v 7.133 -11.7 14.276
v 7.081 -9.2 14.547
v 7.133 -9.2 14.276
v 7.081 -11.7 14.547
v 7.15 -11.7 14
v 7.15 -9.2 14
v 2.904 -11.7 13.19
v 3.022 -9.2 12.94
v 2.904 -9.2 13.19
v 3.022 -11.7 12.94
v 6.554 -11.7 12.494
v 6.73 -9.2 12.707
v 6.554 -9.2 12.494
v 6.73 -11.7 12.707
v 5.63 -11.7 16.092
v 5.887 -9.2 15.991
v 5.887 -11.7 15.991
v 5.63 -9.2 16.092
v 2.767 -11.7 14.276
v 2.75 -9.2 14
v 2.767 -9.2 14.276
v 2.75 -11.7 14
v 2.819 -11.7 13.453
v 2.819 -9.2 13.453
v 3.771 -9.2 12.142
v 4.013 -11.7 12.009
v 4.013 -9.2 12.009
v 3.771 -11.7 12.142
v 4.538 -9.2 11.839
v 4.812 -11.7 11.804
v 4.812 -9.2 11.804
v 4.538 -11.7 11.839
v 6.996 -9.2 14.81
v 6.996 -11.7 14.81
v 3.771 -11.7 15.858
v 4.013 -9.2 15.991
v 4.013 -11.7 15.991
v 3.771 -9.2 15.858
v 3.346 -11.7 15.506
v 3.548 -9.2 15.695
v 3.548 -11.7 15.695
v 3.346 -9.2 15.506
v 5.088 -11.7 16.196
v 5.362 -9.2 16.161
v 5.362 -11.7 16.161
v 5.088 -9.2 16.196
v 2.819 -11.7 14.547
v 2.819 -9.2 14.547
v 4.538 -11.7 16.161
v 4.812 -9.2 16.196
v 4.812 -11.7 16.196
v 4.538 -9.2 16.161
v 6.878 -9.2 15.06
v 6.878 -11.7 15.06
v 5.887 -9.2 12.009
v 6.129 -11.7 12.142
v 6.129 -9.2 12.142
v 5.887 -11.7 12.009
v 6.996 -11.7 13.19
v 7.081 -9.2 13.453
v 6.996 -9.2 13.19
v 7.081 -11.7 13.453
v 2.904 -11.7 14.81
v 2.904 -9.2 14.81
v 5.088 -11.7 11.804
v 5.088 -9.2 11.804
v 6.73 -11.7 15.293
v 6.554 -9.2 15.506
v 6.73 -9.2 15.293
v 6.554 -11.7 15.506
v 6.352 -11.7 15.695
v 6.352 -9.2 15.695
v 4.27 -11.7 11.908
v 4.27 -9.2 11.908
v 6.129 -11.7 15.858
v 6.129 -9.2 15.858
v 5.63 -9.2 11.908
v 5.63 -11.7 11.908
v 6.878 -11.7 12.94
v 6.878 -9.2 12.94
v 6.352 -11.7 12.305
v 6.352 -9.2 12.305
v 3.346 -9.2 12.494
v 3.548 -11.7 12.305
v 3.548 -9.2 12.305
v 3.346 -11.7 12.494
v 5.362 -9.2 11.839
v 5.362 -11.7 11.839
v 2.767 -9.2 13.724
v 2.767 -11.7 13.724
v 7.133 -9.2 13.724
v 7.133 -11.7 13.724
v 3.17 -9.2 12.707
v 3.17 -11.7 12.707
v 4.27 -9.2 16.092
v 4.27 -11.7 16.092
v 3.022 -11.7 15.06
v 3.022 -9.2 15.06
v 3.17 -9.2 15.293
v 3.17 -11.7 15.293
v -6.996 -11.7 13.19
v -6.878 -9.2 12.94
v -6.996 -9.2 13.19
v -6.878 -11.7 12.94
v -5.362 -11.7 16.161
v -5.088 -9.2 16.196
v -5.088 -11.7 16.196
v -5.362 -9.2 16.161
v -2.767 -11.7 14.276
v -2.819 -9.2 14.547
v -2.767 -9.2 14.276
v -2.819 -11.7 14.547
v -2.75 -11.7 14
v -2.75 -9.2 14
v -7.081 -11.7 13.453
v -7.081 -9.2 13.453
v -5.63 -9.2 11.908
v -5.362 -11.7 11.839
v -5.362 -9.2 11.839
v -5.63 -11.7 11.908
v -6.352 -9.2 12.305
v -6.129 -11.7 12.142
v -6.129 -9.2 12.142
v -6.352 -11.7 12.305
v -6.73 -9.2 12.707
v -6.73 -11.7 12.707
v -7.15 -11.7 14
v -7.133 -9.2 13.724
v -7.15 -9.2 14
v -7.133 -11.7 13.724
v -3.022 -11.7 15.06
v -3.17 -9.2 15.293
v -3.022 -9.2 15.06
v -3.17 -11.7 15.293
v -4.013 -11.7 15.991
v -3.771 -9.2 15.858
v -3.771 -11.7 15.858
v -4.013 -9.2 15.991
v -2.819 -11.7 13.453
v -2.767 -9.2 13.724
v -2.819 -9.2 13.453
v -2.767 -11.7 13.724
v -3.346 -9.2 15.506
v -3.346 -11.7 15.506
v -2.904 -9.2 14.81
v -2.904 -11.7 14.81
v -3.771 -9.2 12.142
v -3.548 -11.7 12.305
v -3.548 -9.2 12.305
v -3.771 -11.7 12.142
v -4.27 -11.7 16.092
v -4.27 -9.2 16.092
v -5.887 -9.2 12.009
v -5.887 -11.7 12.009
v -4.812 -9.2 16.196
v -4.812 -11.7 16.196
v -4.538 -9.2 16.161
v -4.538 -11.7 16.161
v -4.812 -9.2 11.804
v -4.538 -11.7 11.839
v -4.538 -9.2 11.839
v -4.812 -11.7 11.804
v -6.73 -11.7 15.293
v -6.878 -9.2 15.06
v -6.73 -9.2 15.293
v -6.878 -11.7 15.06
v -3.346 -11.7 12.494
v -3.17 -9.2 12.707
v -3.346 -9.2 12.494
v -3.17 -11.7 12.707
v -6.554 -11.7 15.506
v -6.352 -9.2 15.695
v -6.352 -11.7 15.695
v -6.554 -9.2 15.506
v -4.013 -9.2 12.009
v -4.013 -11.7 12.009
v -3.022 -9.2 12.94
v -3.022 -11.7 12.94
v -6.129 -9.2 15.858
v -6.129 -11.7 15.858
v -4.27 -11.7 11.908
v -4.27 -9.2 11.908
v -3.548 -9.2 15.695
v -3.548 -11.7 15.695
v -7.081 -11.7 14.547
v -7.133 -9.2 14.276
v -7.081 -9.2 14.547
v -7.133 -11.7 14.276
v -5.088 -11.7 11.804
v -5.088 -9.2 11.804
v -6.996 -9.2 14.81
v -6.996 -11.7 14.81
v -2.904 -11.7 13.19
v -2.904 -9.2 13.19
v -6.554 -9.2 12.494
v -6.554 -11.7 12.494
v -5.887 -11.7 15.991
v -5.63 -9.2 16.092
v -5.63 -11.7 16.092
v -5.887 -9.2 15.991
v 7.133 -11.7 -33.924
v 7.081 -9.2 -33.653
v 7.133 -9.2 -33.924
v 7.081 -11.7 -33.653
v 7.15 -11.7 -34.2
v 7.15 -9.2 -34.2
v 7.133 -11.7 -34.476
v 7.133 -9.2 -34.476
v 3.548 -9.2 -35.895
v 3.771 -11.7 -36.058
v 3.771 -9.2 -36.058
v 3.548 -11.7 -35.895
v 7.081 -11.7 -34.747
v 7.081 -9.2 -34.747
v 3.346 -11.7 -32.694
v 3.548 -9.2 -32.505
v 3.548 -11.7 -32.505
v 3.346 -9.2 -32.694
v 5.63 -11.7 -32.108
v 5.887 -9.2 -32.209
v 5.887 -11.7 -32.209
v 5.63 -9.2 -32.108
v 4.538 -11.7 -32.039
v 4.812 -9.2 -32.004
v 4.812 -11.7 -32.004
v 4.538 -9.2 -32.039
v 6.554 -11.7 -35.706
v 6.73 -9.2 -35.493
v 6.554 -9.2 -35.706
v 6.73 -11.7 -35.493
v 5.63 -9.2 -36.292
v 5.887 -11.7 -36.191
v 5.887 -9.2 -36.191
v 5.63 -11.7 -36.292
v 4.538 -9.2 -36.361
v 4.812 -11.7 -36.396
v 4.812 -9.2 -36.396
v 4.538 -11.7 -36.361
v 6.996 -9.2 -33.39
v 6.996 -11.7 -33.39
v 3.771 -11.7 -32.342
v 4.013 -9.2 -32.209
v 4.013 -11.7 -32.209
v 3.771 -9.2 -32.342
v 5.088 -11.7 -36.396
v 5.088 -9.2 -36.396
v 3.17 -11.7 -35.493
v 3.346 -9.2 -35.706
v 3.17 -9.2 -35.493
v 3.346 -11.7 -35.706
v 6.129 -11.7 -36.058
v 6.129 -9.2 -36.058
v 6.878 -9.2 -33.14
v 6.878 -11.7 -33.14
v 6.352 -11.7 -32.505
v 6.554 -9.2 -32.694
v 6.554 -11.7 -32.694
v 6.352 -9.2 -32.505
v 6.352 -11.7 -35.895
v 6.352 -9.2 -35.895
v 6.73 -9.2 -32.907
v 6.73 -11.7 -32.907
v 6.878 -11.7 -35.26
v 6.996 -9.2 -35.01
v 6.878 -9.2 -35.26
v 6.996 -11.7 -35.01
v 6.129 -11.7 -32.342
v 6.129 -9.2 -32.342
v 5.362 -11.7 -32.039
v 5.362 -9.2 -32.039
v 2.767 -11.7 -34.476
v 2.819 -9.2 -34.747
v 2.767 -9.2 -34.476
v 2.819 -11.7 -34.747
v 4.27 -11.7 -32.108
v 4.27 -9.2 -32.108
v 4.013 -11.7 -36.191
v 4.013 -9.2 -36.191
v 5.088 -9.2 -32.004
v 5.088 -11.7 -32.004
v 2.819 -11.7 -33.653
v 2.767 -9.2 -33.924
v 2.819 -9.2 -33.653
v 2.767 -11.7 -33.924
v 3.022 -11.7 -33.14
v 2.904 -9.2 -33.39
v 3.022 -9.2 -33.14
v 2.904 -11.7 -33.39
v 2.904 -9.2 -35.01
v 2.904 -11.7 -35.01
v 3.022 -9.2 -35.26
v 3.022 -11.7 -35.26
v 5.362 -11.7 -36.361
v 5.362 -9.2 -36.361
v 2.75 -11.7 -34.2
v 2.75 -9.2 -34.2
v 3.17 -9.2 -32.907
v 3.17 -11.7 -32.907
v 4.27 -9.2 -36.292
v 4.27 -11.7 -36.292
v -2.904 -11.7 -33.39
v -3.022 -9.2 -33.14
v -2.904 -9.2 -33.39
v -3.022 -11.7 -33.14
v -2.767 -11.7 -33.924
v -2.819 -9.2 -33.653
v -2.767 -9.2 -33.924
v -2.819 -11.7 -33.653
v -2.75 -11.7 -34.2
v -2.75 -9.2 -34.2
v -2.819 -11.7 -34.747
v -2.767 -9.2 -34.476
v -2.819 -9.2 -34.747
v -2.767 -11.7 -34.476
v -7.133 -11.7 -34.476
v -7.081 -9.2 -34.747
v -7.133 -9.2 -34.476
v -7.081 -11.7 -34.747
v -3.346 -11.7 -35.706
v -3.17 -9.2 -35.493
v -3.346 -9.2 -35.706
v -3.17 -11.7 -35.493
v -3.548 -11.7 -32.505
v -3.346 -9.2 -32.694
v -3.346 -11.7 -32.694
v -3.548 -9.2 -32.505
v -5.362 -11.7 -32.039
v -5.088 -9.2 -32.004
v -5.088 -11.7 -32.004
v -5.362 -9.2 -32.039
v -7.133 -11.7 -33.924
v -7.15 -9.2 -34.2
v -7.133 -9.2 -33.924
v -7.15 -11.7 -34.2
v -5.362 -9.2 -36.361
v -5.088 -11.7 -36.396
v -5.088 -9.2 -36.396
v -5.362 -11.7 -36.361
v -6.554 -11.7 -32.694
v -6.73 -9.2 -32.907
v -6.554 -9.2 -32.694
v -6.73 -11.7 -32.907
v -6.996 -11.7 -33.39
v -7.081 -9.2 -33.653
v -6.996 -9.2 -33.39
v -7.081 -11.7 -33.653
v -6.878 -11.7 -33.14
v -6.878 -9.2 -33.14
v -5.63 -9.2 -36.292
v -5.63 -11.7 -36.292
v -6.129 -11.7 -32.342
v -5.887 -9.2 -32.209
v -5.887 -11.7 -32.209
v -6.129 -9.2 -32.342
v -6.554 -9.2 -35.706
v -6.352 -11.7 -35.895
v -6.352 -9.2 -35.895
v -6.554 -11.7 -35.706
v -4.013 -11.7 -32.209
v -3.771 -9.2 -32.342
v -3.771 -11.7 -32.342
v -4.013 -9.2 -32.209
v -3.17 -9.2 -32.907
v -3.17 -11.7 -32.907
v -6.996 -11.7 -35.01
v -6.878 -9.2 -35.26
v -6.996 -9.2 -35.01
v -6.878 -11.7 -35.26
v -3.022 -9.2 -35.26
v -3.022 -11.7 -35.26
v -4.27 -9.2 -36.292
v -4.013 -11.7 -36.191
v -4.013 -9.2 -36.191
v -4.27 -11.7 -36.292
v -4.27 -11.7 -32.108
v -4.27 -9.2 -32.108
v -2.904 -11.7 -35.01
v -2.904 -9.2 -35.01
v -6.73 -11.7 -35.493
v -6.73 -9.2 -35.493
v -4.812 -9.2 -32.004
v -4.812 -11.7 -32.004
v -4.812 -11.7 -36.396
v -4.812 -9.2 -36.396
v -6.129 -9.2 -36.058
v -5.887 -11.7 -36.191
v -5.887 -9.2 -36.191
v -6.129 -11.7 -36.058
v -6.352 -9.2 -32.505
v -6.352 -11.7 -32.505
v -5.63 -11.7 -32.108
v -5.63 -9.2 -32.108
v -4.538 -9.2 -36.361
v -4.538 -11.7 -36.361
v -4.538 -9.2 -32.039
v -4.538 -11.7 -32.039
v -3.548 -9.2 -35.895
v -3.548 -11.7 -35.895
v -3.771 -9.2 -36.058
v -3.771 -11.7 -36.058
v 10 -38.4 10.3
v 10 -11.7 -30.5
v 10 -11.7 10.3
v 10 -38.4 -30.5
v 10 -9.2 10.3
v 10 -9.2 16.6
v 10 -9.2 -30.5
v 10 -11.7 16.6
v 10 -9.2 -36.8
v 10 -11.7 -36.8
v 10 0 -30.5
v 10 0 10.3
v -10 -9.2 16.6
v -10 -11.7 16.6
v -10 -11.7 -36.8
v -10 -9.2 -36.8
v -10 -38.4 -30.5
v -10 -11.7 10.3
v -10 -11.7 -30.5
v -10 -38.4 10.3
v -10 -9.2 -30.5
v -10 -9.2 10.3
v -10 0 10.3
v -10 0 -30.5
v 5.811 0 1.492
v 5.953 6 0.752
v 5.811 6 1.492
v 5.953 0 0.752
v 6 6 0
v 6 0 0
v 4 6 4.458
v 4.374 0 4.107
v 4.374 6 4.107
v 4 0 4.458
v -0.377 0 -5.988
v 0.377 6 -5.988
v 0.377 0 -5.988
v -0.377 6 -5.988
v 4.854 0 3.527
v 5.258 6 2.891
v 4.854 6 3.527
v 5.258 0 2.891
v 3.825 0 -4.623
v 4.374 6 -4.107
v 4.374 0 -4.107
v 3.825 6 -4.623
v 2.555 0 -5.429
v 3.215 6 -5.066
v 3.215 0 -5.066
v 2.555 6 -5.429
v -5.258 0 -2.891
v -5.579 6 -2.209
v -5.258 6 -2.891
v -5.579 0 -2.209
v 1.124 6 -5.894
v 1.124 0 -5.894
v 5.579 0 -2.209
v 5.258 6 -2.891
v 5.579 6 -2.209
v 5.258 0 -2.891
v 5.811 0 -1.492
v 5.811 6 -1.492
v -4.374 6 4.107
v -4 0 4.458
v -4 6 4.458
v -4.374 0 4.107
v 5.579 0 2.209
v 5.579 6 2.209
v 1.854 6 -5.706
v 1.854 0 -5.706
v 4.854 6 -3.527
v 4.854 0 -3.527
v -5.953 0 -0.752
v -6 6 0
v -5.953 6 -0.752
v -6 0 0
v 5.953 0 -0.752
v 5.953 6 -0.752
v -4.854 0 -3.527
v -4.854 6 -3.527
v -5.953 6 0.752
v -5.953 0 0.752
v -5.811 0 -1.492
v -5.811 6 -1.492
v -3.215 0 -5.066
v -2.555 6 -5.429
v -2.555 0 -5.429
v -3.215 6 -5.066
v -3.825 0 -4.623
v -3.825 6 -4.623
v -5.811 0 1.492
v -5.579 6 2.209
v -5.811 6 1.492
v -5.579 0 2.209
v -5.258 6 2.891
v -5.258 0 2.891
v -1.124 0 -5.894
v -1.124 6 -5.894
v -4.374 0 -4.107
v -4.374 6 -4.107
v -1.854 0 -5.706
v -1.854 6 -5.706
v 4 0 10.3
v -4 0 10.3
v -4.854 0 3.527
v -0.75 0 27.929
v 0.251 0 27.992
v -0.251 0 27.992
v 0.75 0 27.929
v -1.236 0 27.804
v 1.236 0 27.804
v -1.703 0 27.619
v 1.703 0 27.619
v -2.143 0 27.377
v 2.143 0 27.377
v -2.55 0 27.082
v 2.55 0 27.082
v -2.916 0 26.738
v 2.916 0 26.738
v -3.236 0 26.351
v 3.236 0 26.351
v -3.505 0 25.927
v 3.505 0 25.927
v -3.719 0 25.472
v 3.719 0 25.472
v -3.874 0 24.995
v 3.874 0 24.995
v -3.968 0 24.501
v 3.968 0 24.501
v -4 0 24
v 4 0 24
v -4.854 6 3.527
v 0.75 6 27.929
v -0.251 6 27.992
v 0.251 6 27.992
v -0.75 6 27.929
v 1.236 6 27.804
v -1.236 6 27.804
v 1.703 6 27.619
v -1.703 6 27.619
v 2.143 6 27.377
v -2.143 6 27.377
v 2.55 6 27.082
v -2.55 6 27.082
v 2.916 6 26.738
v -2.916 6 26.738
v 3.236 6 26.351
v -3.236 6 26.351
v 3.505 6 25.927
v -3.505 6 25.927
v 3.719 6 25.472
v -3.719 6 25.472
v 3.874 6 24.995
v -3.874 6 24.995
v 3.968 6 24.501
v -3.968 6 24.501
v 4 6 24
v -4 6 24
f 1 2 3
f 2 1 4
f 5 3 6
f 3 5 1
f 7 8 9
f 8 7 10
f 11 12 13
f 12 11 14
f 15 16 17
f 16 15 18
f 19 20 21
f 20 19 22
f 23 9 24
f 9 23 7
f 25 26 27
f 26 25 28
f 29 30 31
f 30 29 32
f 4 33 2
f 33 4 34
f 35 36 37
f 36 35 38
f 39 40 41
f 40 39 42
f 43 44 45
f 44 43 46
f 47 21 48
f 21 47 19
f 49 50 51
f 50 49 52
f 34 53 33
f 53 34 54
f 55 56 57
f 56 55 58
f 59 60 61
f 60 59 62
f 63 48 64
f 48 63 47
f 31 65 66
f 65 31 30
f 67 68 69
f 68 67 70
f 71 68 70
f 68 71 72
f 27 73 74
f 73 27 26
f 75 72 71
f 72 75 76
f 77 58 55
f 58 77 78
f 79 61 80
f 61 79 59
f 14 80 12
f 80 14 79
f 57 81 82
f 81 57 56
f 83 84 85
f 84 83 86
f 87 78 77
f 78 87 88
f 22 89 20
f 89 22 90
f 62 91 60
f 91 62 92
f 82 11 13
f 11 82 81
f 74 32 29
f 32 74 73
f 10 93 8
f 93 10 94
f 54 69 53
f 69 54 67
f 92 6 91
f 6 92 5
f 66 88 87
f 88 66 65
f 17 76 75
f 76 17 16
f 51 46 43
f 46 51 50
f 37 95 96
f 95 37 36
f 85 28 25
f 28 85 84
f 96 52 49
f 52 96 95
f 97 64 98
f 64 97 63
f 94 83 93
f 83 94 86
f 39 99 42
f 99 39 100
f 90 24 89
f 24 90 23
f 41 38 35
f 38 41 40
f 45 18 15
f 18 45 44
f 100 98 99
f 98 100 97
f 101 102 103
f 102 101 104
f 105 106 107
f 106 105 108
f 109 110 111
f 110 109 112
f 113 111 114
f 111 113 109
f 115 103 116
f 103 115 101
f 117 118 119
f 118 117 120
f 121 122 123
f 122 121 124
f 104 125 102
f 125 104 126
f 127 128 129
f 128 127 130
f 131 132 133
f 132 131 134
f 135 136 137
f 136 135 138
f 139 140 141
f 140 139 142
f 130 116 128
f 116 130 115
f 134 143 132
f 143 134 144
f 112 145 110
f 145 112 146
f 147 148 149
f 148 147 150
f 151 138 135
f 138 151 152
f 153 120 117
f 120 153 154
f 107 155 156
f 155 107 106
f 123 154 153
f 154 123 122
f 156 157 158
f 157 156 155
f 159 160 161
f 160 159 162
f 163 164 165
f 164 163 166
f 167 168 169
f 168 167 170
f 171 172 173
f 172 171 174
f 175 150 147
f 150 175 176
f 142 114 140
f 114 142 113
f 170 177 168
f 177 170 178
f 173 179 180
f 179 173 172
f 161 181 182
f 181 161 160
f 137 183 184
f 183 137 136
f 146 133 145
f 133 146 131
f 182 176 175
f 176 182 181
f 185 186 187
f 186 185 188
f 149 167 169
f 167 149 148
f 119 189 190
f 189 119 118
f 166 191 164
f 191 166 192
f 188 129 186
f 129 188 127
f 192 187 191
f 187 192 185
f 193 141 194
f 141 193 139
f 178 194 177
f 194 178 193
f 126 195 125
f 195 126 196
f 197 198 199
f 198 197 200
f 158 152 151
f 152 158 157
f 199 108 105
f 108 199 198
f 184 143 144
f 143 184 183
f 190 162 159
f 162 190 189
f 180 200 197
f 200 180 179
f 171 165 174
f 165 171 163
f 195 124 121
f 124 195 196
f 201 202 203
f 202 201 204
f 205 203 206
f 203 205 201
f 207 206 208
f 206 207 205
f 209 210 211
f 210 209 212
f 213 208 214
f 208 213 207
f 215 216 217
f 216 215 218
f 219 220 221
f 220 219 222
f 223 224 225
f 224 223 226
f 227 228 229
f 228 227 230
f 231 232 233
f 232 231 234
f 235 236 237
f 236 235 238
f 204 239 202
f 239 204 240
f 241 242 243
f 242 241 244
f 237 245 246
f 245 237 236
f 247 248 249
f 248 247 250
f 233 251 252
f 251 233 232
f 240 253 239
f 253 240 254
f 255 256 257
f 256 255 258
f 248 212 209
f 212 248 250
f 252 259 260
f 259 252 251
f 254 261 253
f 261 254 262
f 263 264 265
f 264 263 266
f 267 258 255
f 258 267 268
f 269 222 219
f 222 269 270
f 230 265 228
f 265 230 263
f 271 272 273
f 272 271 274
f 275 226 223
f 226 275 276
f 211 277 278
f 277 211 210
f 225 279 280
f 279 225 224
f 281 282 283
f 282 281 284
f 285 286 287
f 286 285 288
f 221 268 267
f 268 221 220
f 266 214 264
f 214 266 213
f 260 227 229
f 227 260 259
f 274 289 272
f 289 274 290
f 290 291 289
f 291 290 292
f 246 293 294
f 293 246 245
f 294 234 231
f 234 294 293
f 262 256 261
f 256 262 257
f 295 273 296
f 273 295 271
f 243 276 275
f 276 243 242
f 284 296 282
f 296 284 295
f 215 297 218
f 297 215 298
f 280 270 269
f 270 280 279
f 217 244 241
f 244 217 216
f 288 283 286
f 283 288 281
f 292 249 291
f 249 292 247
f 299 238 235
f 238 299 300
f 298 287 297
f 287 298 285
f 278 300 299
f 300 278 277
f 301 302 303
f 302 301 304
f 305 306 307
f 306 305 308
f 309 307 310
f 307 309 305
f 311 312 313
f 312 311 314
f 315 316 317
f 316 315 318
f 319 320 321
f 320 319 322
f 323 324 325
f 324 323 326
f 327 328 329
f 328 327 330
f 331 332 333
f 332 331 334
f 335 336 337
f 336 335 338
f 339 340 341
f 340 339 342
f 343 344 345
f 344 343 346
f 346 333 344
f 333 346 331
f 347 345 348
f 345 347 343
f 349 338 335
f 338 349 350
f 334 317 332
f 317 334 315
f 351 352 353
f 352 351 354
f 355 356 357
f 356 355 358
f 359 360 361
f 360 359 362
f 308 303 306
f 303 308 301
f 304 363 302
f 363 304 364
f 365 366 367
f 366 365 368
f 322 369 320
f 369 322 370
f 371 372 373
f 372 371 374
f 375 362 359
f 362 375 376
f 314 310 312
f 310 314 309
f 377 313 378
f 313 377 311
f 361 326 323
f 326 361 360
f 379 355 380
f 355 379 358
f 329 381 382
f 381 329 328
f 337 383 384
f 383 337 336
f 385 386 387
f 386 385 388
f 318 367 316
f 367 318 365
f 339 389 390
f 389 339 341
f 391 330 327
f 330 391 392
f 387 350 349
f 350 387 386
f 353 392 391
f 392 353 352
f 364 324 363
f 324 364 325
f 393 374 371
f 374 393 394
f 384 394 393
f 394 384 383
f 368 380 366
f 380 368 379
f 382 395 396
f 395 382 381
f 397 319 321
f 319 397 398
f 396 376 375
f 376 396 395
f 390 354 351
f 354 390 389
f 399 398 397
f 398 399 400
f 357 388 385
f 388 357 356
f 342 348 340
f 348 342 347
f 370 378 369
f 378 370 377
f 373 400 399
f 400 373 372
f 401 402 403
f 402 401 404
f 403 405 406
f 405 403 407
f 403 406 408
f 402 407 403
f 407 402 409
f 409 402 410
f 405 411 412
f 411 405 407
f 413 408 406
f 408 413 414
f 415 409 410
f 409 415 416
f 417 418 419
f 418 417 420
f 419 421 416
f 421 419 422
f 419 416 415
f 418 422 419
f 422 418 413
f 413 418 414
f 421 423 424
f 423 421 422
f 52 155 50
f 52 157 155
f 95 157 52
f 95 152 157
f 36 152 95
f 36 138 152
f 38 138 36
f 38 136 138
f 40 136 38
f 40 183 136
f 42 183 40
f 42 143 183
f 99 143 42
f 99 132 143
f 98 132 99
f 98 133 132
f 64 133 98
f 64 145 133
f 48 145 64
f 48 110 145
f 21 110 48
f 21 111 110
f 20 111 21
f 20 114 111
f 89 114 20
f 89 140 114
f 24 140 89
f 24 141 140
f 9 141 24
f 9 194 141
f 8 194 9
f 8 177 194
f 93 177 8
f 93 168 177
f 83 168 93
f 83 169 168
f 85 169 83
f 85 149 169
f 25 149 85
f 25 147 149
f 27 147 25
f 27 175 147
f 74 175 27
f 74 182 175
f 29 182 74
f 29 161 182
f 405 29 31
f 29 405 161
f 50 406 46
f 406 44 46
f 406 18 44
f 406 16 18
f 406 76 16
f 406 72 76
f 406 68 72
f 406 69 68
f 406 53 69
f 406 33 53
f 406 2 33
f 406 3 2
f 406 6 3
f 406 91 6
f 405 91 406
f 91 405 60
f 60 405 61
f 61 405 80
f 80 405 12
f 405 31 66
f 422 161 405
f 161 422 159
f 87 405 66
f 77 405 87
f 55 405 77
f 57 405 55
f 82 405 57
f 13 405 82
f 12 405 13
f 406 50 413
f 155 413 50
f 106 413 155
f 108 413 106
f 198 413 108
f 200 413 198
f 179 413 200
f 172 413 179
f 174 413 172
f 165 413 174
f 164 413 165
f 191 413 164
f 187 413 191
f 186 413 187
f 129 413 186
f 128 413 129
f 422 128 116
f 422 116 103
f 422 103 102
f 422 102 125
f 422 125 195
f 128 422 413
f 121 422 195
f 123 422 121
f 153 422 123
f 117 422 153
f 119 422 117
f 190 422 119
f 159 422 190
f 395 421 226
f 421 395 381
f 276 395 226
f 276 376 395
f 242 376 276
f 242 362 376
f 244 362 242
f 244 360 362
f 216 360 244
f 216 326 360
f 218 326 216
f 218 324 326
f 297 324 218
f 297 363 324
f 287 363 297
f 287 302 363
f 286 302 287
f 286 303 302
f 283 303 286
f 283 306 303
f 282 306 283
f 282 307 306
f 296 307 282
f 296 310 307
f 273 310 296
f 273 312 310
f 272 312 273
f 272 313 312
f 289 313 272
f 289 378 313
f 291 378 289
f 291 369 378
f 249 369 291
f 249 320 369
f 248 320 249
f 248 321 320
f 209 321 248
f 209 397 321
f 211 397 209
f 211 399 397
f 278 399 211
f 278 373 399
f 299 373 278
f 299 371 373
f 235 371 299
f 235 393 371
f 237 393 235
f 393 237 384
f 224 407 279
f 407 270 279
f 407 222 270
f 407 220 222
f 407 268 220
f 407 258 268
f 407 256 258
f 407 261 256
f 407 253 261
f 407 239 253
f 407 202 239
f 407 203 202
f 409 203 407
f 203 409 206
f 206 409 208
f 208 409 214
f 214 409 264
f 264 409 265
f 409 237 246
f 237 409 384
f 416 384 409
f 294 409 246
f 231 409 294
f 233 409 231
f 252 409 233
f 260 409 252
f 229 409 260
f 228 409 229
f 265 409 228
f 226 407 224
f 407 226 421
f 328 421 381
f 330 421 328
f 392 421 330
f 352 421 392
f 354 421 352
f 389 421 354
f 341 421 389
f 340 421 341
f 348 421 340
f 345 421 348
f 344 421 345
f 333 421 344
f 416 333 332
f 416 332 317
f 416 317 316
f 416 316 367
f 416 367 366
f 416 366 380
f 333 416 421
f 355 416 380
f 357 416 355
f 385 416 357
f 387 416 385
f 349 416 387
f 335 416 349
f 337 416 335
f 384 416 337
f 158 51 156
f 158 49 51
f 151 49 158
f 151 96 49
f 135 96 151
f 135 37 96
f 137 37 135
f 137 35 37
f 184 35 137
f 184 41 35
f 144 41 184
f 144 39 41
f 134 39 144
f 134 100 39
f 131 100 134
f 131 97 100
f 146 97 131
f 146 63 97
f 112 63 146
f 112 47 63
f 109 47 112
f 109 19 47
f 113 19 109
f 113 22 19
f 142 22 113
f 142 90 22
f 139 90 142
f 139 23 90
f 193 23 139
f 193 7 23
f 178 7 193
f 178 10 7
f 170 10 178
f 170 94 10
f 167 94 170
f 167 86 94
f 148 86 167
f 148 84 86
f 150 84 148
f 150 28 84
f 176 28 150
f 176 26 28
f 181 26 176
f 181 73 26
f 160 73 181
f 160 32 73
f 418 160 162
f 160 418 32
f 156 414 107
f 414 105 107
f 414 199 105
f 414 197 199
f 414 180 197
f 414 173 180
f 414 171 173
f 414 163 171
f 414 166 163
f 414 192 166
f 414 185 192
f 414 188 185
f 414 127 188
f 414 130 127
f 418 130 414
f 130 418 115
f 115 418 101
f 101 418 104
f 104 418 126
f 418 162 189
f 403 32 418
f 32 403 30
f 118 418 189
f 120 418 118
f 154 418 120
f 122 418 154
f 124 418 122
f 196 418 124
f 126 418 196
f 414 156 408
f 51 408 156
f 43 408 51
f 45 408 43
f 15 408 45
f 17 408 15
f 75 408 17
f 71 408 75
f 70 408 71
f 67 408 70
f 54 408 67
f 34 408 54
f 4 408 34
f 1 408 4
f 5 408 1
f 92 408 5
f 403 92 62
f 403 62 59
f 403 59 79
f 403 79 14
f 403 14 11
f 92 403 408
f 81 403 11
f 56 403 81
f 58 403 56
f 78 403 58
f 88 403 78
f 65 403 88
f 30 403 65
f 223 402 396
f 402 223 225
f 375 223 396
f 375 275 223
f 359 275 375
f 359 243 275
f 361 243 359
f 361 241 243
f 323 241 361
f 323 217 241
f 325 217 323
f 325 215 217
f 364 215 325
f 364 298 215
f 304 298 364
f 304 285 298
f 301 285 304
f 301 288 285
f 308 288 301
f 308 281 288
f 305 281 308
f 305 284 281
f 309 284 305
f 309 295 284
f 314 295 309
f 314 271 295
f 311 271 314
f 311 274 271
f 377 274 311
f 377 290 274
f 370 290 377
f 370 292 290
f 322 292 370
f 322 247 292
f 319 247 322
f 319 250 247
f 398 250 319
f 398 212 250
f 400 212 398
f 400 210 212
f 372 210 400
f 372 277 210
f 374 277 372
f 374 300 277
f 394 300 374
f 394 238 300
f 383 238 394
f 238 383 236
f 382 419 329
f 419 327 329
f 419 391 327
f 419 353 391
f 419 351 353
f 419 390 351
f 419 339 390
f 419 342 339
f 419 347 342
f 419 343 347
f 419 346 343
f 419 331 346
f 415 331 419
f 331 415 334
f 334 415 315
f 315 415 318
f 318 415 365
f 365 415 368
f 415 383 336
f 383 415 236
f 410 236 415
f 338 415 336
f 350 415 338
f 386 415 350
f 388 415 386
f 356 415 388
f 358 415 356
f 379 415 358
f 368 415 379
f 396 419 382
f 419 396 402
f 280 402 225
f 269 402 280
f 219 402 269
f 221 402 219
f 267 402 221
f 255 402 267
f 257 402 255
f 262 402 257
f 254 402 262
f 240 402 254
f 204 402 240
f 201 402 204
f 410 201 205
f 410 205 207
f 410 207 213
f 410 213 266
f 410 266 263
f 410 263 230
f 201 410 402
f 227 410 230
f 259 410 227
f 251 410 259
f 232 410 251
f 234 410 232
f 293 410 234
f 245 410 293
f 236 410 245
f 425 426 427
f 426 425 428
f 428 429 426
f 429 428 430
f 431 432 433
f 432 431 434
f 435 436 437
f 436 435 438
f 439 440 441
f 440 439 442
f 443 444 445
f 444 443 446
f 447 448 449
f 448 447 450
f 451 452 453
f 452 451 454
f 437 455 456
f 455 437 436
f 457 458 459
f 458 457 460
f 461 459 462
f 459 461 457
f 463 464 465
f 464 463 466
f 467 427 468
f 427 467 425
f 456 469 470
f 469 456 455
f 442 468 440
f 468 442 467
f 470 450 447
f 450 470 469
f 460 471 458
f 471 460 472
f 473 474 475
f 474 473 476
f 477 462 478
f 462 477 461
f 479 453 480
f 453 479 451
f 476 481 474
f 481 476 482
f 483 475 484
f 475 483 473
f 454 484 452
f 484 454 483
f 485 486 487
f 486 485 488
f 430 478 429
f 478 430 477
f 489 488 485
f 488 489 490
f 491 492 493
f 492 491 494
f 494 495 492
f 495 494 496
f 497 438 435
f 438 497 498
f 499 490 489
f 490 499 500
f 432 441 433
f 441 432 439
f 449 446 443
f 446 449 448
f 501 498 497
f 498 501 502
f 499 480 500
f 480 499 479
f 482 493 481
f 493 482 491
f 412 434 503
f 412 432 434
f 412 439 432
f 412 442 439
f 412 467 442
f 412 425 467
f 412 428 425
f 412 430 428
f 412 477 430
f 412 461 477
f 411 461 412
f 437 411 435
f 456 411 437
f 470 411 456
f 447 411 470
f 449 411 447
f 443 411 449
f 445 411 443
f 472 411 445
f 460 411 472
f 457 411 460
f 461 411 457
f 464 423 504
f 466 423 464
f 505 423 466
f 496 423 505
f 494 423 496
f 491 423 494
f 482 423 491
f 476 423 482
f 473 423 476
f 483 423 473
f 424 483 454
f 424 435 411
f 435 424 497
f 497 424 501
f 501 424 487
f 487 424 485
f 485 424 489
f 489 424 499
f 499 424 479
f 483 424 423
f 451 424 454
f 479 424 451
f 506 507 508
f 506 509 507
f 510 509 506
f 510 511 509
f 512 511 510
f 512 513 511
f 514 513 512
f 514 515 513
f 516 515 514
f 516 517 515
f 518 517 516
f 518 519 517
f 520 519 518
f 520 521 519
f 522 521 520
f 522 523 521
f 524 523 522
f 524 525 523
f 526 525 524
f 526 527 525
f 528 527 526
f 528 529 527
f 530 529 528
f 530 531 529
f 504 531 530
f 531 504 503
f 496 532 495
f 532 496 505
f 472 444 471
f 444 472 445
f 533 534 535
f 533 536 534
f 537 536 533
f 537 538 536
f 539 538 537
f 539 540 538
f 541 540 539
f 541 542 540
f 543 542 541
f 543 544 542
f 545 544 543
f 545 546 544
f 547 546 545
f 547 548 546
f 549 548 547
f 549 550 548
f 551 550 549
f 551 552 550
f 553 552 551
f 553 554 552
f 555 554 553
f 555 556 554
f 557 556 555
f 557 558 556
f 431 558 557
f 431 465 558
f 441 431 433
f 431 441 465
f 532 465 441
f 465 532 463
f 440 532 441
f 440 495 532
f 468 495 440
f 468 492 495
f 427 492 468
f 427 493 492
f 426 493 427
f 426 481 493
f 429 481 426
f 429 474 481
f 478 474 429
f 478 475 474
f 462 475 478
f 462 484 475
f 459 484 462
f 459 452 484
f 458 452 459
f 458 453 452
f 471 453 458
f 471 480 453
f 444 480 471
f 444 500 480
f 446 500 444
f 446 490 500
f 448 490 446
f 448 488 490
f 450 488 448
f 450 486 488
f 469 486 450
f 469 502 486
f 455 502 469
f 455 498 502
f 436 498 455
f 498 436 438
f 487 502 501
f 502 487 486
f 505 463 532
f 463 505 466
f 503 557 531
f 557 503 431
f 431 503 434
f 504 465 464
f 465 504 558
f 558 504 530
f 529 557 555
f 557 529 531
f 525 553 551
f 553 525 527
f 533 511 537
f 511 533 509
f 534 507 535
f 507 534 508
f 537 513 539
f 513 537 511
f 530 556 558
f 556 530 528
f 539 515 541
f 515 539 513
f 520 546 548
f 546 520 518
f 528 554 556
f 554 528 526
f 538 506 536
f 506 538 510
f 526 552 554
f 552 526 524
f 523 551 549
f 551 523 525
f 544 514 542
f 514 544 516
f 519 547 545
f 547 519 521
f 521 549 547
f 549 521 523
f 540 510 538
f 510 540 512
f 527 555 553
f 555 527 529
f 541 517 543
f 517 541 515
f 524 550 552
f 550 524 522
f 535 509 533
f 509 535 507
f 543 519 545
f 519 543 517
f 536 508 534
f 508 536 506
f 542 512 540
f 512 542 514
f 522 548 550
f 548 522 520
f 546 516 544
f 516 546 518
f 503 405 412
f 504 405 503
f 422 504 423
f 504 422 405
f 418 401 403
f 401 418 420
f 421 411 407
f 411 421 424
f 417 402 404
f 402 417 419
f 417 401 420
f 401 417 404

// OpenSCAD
// copyright: GNU @kuberlog
// https://www.amazon.com/4-Pack-MG996R-Torque-Digital-Helicopter/dp/B07MFK266B

$fn = 50;

body_x = 20;
body_y = 38.4;
body_z = 40.8;
body_delta_y = -body_y/2;

tab_x = 20;
tab_y = 2.5; // this dimension, we also do not know yet, measure
tab_z = 53.4;
tab_delta_y = -(9.2 + (tab_y/2));

body_delta_z = -(tab_z/2-16.6); // this dimension, we do not know yet, measure
tab_delta_z = body_delta_z;

hole_d = 4.4;
hole_h = tab_y + 2; //through-hole
hole_delta_y = tab_delta_y + 1; // through hole
hole_delta_x = 9.9/2;
hole_delta_z = 48.2/2;
holes_delta_z = body_delta_z;
holes_deta_y = -tab_y/2;

horn_y = 6;
horn_delta_y = horn_y/2;
horn_base_d = 12;
horn_extension_z = 24;
horn_tip_d = 8;
horn_extension_x = horn_tip_d;
horn_extension_delta_z = horn_extension_z/2;
horn_tip_delta_z = horn_extension_z;


module body() {
  color([0.2,0.2,0.2]) translate([0, body_delta_y, body_delta_z]) cube([body_x, body_y, body_z], center=true);
}

module tab() {
  difference() {
    color([0.2, 0.2, 0.2]) translate([0, tab_delta_y, tab_delta_z]) cube([tab_x, tab_y, tab_z], center=true);
    holes();
  }
}

module hole() {
  rotate([90,0,0]) cylinder(d=hole_d, h=hole_h, center=true);
}

module holes() {
  color([114/255, 29/255, 138/255]) {
    translate([0,holes_deta_y,body_delta_z]) {
      translate([hole_delta_x, hole_delta_y, hole_delta_z]) hole();
      translate([-hole_delta_x, hole_delta_y, hole_delta_z]) hole();
      translate([hole_delta_x, hole_delta_y, -hole_delta_z]) hole();
      translate([-hole_delta_x, hole_delta_y, -hole_delta_z]) hole();
    }
  }
}

module horn() {
  color([114/255, 29/255, 138/255]) {
    translate([0,horn_delta_y,0]) {
      rotate([90, 0, 0]) cylinder(d=horn_base_d, h=horn_y, center=true);
      translate([0,0,horn_extension_delta_z]) cube([horn_extension_x, horn_y, horn_extension_z], center=true);
      translate([0,0,horn_tip_delta_z]) rotate([90,0,0]) cylinder(d=horn_tip_d, h = horn_y, center=true);
      
    }
  }
}

module ServoMG996r(x) {
  body();
  tab();
  rotate([0,x,0]) horn();
}

ServoMG996r(0);
